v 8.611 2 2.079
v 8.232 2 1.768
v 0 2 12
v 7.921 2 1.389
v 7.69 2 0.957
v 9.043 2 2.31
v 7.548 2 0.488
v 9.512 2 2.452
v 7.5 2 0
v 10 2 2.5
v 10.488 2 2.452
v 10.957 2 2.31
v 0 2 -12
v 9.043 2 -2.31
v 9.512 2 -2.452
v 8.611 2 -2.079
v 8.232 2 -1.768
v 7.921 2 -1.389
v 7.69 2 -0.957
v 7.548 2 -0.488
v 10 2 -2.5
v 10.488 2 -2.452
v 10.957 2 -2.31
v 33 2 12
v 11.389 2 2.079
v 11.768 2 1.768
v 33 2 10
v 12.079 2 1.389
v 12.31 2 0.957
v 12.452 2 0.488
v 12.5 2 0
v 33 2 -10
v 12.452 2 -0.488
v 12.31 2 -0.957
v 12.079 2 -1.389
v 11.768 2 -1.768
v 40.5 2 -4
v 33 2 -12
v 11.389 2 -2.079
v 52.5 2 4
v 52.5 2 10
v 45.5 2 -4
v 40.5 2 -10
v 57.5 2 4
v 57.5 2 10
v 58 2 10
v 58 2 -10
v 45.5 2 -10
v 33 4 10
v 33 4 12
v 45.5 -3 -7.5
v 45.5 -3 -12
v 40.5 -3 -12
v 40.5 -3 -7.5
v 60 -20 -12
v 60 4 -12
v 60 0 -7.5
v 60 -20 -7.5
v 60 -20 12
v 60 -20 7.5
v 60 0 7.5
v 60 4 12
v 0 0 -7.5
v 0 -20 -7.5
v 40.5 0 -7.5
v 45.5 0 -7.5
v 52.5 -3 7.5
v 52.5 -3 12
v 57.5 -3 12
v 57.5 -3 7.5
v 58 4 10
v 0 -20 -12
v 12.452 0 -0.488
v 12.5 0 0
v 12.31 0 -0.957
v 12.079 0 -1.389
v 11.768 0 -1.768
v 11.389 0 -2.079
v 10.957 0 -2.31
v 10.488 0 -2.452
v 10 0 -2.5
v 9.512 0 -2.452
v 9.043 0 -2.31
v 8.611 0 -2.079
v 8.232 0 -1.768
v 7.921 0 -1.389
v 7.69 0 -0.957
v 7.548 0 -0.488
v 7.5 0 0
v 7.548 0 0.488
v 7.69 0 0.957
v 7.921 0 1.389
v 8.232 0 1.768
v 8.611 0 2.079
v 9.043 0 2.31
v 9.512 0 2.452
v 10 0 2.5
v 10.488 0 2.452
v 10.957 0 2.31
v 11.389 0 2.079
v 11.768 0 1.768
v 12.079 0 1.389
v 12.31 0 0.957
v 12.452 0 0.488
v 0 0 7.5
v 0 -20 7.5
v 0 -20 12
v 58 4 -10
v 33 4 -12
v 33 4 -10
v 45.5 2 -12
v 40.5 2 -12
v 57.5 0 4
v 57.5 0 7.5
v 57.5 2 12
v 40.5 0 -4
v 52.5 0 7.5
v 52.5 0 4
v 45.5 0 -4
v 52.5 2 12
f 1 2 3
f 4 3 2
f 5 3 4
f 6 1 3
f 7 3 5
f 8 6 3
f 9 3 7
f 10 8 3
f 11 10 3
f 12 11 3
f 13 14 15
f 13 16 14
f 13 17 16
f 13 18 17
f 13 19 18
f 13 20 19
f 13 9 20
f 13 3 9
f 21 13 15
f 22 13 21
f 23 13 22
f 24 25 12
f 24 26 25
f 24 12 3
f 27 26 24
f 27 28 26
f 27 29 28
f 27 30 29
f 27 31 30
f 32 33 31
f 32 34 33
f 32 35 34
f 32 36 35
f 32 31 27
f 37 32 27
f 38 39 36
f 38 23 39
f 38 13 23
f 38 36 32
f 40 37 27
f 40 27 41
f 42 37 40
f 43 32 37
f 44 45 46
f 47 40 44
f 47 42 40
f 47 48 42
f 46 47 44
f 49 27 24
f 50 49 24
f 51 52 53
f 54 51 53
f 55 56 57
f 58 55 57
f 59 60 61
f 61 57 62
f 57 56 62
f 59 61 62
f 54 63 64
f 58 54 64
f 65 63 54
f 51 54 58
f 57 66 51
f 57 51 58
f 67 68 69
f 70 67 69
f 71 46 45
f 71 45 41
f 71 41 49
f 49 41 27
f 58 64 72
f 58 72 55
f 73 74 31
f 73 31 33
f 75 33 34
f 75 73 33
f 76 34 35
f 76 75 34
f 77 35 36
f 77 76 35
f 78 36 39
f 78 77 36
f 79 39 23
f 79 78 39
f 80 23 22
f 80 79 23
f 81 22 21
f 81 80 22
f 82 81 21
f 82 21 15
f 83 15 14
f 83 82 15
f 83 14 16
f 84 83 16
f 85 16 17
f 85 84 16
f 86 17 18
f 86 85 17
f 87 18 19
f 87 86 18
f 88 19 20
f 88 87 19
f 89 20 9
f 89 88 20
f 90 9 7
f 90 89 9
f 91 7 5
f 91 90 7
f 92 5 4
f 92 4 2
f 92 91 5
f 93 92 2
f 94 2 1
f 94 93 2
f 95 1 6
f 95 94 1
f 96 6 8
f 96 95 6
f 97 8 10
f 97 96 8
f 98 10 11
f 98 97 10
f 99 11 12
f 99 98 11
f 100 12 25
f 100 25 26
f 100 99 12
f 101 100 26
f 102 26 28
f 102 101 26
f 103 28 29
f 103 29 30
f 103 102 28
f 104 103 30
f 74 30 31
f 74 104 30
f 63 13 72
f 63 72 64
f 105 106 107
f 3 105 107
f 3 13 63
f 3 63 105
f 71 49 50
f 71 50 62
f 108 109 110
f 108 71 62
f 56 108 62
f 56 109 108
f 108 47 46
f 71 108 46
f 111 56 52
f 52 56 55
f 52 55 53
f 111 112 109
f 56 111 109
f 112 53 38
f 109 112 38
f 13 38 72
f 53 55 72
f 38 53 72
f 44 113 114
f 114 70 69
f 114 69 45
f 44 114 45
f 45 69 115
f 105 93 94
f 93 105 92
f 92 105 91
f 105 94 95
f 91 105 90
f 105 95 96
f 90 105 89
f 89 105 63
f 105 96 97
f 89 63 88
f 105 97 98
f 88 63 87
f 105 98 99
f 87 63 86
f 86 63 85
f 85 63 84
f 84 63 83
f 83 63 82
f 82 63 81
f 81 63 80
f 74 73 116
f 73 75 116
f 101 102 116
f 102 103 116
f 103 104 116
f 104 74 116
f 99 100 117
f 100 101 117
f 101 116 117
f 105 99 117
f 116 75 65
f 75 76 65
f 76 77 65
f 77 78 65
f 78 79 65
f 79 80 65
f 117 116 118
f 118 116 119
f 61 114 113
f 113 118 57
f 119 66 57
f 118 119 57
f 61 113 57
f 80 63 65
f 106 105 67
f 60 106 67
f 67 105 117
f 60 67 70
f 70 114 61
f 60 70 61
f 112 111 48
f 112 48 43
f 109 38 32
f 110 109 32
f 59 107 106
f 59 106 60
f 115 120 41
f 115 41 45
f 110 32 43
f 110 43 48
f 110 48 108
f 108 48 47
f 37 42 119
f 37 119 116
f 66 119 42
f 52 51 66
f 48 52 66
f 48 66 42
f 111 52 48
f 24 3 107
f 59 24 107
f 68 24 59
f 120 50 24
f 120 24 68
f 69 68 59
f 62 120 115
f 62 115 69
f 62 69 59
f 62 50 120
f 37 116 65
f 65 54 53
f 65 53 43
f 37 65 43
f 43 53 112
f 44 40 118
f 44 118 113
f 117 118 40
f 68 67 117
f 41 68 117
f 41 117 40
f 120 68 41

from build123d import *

# Parameters (mm, degrees)
ESQUISSE1_W             = 60
ESQUISSE1_H             = 24
ESQUISSE1_R             = 2.5
BOSS_EXTRU_1_DEPTH      = 2
BOSS_EXTRU_2_DEPTH      = 2
ESQUISSE3_W             = 60
ESQUISSE3_H             = 4.5
BOSS_EXTRU_3_DEPTH      = 20
ESQUISSE5_W             = 5
ESQUISSE5_H             = 5
ENL_V_MAT_EXTRU_2_DEPTH = 8
ESQUISSE6_W             = 5
ESQUISSE6_H             = 5
ENL_V_MAT_EXTRU_3_DEPTH = 8


with BuildPart() as part:
    # Esquisse1 → Boss.-Extru.1 (new body)
    with BuildSketch(Plane(origin=(0, 0, 0), x_dir=(1, 0, 0), z_dir=(0, 1, 0))):
        with Locations((30, 0)):
            Rectangle(ESQUISSE1_W, ESQUISSE1_H)
        with Locations((10, 0)):
            Circle(ESQUISSE1_R, mode=Mode.SUBTRACT)
    extrude(amount=BOSS_EXTRU_1_DEPTH)

    # Esquisse2 → Boss.-Extru.2 (add)
    with BuildSketch(Plane(origin=(0, 2, 0), x_dir=(1, 0, 0), z_dir=(0, 1, 0))):
        Polygon((60, 12), (33, 12), (33, 10), (58, 10), (58, -10), (33, -10), (33, -12), (60, -12), align=None)
    extrude(amount=BOSS_EXTRU_2_DEPTH)

    # Esquisse3 → Boss.-Extru.3 (add)
    with BuildSketch(Plane.XZ):
        with Locations((30, 9.75)):
            Rectangle(ESQUISSE3_W, ESQUISSE3_H)
        with Locations((30, -9.75)):
            Rectangle(ESQUISSE3_W, ESQUISSE3_H)
    extrude(amount=BOSS_EXTRU_3_DEPTH)

    # Esquisse5 → Enlèv. mat.-Extru.2 (cut)
    with BuildSketch(Plane.XY.offset(12)):
        with Locations((55, -0.5)):
            Rectangle(ESQUISSE5_W, ESQUISSE5_H)
    extrude(amount=-ENL_V_MAT_EXTRU_2_DEPTH, mode=Mode.SUBTRACT)

    # Esquisse6 → Enlèv. mat.-Extru.3 (cut)
    with BuildSketch(Plane(origin=(0, 0, -12), x_dir=(-1, 0, 0), z_dir=(0, 0, -1))):
        with Locations((-43, -0.5)):
            Rectangle(ESQUISSE6_W, ESQUISSE6_H)
    extrude(amount=-ENL_V_MAT_EXTRU_3_DEPTH, mode=Mode.SUBTRACT)


solid = part.part
